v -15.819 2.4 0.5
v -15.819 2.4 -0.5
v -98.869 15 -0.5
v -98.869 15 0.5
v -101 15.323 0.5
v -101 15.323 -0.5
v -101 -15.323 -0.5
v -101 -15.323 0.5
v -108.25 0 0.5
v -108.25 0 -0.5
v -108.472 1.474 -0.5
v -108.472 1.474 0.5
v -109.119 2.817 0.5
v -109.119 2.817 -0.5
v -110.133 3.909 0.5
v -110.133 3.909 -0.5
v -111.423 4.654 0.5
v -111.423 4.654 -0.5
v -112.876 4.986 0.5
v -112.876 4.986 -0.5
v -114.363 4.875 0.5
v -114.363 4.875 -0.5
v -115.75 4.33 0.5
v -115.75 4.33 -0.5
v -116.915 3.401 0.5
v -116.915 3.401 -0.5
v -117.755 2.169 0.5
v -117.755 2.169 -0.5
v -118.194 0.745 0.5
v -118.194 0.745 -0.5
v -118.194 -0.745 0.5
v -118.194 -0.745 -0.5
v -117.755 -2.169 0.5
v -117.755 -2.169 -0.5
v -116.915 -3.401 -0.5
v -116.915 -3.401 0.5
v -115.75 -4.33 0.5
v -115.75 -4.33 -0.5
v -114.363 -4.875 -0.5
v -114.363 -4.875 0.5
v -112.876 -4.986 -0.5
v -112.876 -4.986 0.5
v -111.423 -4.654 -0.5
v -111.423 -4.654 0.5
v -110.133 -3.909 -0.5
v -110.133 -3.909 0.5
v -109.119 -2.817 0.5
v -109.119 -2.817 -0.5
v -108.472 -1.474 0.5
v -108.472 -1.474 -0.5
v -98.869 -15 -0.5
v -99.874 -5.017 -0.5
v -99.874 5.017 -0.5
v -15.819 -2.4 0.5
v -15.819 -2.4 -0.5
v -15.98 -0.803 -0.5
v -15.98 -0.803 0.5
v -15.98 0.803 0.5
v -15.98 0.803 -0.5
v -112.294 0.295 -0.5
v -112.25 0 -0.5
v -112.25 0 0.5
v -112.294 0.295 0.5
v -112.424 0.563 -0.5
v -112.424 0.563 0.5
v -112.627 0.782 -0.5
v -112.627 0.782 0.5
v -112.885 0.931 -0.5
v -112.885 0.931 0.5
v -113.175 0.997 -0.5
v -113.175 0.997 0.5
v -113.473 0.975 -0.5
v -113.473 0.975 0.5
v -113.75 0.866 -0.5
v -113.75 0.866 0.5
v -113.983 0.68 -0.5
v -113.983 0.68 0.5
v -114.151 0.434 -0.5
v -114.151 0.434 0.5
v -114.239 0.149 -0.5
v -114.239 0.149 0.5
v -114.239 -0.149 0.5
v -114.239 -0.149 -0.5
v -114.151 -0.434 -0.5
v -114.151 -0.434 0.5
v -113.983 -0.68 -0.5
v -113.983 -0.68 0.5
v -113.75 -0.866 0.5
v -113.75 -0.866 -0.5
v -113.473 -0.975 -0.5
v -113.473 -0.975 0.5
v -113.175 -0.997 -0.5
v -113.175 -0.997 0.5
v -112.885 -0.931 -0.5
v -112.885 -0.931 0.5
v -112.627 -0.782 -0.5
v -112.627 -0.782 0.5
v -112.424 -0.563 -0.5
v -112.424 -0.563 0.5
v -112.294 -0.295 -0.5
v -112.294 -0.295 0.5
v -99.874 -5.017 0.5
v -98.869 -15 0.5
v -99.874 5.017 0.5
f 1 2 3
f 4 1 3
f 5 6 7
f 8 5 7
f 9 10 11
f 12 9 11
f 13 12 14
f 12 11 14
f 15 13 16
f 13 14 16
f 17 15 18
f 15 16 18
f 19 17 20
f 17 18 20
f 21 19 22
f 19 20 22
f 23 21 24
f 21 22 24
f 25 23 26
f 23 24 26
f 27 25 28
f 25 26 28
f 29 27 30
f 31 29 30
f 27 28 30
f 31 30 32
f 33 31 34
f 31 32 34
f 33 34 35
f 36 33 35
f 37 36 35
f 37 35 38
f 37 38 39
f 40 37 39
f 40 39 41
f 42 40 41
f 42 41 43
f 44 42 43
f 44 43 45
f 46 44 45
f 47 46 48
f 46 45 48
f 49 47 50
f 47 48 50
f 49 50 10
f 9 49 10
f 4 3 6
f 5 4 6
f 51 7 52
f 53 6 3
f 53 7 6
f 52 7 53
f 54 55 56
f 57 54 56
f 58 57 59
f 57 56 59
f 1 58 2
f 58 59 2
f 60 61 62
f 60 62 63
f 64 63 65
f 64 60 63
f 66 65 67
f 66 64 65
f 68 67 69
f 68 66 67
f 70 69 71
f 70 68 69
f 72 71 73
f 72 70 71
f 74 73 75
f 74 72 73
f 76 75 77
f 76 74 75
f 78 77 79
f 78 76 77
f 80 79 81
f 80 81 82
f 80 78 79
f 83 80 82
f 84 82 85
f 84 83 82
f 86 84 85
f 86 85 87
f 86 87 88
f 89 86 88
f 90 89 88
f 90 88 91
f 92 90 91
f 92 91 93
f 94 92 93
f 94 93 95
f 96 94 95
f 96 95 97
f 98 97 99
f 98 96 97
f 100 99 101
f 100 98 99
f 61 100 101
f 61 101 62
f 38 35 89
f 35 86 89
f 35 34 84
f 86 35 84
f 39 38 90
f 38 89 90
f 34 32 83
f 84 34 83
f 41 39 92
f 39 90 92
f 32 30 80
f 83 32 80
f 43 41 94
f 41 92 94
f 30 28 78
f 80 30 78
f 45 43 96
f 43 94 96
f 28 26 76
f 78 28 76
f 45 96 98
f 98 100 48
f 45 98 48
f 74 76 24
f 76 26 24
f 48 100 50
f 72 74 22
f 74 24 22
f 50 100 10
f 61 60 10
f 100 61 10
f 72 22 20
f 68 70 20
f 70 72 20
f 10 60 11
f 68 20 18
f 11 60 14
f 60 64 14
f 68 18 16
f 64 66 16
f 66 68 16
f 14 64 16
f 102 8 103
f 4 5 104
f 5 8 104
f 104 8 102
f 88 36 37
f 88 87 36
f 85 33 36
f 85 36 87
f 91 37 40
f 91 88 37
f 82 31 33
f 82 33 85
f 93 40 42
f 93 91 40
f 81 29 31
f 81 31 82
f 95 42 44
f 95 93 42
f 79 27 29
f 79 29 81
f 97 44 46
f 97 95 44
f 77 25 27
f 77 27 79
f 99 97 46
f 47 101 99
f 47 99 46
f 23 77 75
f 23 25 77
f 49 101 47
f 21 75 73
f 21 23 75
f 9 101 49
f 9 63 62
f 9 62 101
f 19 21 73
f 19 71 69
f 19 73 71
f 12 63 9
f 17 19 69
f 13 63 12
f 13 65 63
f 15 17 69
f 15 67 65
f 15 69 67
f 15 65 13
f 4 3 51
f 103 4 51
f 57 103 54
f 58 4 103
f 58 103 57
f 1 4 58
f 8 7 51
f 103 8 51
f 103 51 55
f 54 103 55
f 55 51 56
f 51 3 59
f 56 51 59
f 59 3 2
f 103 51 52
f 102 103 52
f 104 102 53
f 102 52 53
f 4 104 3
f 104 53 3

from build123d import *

# Parameters (mm, degrees)
BOSS_EXTRUDE1_DEPTH        = 0.5
BOSS_EXTRUDE1_DEPTH_BACK   = 0.5
BOSS_EXTRUDE1_2_DEPTH      = 0.5
BOSS_EXTRUDE1_2_DEPTH_BACK = 0.5
BOSS_EXTRUDE2_DEPTH        = 0.5
BOSS_EXTRUDE2_DEPTH_BACK   = 0.5
SKETCH2_R                  = 5
SKETCH2_R_2                = 1


with BuildPart() as part:
    # Sketch1 → Boss-Extrude1 (new, two sides: drawn at the far end of the back side and taken through both)
    with BuildSketch(Plane.XY.offset(-BOSS_EXTRUDE1_DEPTH_BACK)):
        with BuildLine():
            ThreePointArc((-15.818975947, -2.4), (-16, 0), (-15.818975947, 2.4))
            Line((-15.818975947, 2.4), (-98.868599666, 15))
            Line((-98.868599666, 15), (-98.868599666, -15))
            Line((-98.868599666, -15), (-15.818975947, -2.4))
        make_face()
    extrude(amount=BOSS_EXTRUDE1_DEPTH + BOSS_EXTRUDE1_DEPTH_BACK)


with BuildPart() as body_2:
    # Sketch1 → Boss-Extrude1 2 (new, two sides: drawn at the far end of the back side and taken through both)
    with BuildSketch(Plane.XY.offset(-BOSS_EXTRUDE1_2_DEPTH_BACK)):
        with BuildLine():
            ThreePointArc((-98.868599666, -15), (-100, 0), (-98.868599666, 15))
            Line((-98.868599666, 15), (-101, 15.323368644))
            Line((-101, 15.323368644), (-101, -15.323368644))
            Line((-101, -15.323368644), (-98.868599666, -15))
        make_face()
    extrude(amount=BOSS_EXTRUDE1_2_DEPTH + BOSS_EXTRUDE1_2_DEPTH_BACK)


with BuildPart() as body_3:
    # Sketch2 → Boss-Extrude2 (new, two sides: drawn at the far end of the back side and taken through both)
    with BuildSketch(Plane.XY.offset(-BOSS_EXTRUDE2_DEPTH_BACK)):
        with Locations((-113.25, 0)):
            Circle(SKETCH2_R)
        with Locations((-113.25, 0)):
            Circle(SKETCH2_R_2, mode=Mode.SUBTRACT)
    extrude(amount=BOSS_EXTRUDE2_DEPTH + BOSS_EXTRUDE2_DEPTH_BACK)


solid = Compound([part.part, body_2.part, body_3.part])
